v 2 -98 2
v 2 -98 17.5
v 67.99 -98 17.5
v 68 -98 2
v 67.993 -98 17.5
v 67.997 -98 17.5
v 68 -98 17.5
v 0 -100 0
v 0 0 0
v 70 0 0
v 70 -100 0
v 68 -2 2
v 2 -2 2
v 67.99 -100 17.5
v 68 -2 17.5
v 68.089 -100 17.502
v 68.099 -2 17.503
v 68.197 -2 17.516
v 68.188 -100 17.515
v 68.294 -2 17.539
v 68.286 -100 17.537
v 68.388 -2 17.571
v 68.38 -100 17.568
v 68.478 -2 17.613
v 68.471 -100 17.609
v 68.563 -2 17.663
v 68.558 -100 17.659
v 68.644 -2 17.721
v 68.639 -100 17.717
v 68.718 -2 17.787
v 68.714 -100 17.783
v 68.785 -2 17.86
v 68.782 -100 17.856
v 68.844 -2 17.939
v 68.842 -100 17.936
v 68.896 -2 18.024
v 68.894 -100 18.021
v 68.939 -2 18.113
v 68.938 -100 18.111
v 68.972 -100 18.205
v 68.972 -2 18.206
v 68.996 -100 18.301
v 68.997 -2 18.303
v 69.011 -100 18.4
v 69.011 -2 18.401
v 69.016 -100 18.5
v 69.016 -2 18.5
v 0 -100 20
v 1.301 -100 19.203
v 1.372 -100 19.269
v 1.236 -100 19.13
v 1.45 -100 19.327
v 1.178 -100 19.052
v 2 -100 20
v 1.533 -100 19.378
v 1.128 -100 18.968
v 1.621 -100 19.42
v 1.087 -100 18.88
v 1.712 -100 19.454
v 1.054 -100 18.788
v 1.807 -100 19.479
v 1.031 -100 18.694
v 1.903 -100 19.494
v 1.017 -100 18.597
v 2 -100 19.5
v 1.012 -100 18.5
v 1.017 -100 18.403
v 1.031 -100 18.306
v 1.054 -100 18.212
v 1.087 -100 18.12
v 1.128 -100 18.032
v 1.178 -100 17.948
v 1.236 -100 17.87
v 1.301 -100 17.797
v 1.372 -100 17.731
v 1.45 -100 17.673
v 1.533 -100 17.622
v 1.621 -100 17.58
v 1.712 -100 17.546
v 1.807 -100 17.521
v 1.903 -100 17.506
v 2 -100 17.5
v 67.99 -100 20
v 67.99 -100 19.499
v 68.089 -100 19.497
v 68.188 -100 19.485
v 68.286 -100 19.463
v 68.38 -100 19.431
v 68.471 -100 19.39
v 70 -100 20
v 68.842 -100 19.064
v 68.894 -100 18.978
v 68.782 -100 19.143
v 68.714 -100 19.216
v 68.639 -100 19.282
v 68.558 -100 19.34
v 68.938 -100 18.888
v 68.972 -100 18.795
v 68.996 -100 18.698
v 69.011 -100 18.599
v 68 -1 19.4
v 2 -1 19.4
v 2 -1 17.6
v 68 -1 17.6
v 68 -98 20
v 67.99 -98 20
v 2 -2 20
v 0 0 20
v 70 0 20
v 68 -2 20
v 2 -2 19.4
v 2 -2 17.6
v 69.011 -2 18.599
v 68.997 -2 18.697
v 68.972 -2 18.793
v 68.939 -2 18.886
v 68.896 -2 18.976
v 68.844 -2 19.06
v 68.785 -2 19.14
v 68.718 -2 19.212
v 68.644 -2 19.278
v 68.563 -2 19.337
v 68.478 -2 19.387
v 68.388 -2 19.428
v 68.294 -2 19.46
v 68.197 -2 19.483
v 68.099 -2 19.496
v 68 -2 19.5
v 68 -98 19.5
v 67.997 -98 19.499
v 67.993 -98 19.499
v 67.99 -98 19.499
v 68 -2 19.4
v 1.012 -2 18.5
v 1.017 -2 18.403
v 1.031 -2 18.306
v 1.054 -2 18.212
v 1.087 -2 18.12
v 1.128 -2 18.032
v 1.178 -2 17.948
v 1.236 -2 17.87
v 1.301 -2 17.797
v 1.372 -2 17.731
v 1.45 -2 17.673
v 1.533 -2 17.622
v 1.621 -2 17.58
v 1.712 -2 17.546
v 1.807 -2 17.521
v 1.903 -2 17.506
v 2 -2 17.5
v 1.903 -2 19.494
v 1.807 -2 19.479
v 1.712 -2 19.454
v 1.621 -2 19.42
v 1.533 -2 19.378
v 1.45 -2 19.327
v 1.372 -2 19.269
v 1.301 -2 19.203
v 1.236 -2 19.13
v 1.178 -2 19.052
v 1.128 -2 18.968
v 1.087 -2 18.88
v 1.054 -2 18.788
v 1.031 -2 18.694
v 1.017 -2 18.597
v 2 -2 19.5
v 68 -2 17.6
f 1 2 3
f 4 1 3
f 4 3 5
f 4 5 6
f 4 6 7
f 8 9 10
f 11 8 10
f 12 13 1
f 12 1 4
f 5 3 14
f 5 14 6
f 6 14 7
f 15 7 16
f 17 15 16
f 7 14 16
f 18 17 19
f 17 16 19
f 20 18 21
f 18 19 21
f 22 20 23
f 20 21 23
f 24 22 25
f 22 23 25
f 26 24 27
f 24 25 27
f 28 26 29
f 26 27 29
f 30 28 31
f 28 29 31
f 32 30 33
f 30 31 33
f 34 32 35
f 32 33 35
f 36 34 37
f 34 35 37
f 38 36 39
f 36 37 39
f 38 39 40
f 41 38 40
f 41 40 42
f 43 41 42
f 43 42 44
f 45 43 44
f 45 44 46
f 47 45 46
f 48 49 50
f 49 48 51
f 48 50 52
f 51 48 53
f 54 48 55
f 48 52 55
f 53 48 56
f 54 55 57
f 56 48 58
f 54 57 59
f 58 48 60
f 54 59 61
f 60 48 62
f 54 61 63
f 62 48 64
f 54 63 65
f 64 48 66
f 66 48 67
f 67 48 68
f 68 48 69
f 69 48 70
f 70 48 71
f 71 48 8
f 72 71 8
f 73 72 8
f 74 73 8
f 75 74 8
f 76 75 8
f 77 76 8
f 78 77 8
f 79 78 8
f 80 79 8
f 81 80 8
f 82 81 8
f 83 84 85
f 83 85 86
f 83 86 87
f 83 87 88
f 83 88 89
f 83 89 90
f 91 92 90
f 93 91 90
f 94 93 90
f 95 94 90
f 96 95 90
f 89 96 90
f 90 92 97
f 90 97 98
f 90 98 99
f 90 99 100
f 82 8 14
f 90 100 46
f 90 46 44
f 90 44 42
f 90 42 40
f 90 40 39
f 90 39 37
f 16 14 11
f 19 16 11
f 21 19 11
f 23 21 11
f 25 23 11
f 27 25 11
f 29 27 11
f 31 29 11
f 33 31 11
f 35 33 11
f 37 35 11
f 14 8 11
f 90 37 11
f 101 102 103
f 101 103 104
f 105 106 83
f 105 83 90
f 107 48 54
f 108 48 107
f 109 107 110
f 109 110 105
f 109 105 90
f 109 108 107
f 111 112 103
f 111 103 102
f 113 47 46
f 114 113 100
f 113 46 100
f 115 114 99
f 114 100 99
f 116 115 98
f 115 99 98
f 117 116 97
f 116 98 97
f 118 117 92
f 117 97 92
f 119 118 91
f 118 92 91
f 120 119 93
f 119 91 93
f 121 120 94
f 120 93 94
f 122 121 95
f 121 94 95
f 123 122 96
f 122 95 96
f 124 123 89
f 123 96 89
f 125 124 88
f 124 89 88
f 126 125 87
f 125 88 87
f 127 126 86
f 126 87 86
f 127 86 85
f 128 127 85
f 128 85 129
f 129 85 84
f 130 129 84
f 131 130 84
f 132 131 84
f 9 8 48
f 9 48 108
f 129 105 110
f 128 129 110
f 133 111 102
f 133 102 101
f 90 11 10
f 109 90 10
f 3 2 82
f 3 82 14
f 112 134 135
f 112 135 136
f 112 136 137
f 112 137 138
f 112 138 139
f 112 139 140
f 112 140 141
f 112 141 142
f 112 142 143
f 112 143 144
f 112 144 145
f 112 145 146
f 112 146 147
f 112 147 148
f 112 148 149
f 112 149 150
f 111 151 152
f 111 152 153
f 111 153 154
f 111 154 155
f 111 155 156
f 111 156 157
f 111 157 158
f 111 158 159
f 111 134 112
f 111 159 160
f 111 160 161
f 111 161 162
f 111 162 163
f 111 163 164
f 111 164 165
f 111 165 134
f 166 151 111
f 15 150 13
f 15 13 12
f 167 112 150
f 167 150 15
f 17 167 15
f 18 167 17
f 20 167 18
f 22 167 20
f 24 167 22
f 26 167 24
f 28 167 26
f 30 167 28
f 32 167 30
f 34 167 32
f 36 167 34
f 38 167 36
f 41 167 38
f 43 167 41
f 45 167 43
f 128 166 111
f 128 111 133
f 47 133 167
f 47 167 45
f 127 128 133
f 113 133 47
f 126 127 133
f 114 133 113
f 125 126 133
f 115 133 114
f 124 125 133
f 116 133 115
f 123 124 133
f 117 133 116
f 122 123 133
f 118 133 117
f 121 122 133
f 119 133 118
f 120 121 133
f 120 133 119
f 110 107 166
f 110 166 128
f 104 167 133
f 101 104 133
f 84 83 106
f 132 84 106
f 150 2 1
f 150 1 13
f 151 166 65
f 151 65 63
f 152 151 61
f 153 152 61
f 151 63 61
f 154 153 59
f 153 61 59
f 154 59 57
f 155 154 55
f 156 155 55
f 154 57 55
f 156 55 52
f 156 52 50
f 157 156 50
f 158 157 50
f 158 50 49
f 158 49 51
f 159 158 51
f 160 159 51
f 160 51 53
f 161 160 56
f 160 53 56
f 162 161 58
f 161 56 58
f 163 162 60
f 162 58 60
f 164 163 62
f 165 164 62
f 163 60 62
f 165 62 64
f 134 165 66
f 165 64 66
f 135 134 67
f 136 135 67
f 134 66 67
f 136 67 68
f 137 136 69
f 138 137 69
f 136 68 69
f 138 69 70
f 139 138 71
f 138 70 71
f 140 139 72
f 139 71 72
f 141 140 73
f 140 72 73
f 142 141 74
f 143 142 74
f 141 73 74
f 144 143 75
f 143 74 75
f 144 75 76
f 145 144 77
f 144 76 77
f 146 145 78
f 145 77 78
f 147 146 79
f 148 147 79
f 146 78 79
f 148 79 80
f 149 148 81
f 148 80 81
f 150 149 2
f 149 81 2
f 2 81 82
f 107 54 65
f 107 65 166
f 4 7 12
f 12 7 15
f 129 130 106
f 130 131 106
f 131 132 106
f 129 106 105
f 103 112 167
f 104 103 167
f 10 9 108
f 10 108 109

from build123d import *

# Parameters (mm, degrees)
F0_W     = 70
F0_H     = 100
F1_DEPTH = 20
F2_W     = 66
F2_H     = 96
F3_DEPTH = 18
F4_W     = 65.9895728827
F4_H     = 2
F5_DEPTH = 2.5
F7_DEPTH = 98
F8_W     = 66
F8_H     = 1.7997355314
F9_DEPTH = 1


with BuildPart() as f1:
    # F0 (on Top) → F1 (new body)
    with BuildSketch(Plane.XY):
        with Locations((35, -50)):
            Rectangle(F0_W, F0_H)
    extrude(amount=F1_DEPTH)

    # F2 (on face) → F3 (cut)
    with BuildSketch(Plane.XY.offset(20)):
        with Locations((35, -50)):
            Rectangle(F2_W, F2_H)
    extrude(amount=-F3_DEPTH, mode=Mode.SUBTRACT)

    # F4 (on face) → F5 (cut)
    with BuildSketch(Plane.XY.offset(20)):
        with Locations((34.9947864413, -99)):
            Rectangle(F4_W, F4_H)
    extrude(amount=-F5_DEPTH, mode=Mode.SUBTRACT)

    # F6 (on face) → F7 (cut)
    with BuildSketch(Plane.XZ.offset(100)):
        with BuildLine():
            Line((67.9895728827, 19.4992875666), (67.9895728827, 17.5))
            ThreePointArc((67.9895728827, 17.5), (68.7138689095, 17.7831631236), (69.016261954, 18.4996437833))
            ThreePointArc((69.016261954, 18.4996437833), (68.7138689095, 19.216124443), (67.9895728827, 19.4992875666))
        make_face()
        with BuildLine():
            ThreePointArc((2, 19.4998536759), (1.0120962274, 18.499926838), (2, 17.5))
            Line((2, 17.5), (2, 19.4998536759))
        make_face()
    extrude(amount=-F7_DEPTH, mode=Mode.SUBTRACT)

    # F8 (on face) → F9 (cut)
    with BuildSketch(Plane.XZ.offset(2)):
        with Locations((35, 18.4996437833)):
            Rectangle(F8_W, F8_H)
    extrude(amount=-F9_DEPTH, mode=Mode.SUBTRACT)


solid = f1.part
